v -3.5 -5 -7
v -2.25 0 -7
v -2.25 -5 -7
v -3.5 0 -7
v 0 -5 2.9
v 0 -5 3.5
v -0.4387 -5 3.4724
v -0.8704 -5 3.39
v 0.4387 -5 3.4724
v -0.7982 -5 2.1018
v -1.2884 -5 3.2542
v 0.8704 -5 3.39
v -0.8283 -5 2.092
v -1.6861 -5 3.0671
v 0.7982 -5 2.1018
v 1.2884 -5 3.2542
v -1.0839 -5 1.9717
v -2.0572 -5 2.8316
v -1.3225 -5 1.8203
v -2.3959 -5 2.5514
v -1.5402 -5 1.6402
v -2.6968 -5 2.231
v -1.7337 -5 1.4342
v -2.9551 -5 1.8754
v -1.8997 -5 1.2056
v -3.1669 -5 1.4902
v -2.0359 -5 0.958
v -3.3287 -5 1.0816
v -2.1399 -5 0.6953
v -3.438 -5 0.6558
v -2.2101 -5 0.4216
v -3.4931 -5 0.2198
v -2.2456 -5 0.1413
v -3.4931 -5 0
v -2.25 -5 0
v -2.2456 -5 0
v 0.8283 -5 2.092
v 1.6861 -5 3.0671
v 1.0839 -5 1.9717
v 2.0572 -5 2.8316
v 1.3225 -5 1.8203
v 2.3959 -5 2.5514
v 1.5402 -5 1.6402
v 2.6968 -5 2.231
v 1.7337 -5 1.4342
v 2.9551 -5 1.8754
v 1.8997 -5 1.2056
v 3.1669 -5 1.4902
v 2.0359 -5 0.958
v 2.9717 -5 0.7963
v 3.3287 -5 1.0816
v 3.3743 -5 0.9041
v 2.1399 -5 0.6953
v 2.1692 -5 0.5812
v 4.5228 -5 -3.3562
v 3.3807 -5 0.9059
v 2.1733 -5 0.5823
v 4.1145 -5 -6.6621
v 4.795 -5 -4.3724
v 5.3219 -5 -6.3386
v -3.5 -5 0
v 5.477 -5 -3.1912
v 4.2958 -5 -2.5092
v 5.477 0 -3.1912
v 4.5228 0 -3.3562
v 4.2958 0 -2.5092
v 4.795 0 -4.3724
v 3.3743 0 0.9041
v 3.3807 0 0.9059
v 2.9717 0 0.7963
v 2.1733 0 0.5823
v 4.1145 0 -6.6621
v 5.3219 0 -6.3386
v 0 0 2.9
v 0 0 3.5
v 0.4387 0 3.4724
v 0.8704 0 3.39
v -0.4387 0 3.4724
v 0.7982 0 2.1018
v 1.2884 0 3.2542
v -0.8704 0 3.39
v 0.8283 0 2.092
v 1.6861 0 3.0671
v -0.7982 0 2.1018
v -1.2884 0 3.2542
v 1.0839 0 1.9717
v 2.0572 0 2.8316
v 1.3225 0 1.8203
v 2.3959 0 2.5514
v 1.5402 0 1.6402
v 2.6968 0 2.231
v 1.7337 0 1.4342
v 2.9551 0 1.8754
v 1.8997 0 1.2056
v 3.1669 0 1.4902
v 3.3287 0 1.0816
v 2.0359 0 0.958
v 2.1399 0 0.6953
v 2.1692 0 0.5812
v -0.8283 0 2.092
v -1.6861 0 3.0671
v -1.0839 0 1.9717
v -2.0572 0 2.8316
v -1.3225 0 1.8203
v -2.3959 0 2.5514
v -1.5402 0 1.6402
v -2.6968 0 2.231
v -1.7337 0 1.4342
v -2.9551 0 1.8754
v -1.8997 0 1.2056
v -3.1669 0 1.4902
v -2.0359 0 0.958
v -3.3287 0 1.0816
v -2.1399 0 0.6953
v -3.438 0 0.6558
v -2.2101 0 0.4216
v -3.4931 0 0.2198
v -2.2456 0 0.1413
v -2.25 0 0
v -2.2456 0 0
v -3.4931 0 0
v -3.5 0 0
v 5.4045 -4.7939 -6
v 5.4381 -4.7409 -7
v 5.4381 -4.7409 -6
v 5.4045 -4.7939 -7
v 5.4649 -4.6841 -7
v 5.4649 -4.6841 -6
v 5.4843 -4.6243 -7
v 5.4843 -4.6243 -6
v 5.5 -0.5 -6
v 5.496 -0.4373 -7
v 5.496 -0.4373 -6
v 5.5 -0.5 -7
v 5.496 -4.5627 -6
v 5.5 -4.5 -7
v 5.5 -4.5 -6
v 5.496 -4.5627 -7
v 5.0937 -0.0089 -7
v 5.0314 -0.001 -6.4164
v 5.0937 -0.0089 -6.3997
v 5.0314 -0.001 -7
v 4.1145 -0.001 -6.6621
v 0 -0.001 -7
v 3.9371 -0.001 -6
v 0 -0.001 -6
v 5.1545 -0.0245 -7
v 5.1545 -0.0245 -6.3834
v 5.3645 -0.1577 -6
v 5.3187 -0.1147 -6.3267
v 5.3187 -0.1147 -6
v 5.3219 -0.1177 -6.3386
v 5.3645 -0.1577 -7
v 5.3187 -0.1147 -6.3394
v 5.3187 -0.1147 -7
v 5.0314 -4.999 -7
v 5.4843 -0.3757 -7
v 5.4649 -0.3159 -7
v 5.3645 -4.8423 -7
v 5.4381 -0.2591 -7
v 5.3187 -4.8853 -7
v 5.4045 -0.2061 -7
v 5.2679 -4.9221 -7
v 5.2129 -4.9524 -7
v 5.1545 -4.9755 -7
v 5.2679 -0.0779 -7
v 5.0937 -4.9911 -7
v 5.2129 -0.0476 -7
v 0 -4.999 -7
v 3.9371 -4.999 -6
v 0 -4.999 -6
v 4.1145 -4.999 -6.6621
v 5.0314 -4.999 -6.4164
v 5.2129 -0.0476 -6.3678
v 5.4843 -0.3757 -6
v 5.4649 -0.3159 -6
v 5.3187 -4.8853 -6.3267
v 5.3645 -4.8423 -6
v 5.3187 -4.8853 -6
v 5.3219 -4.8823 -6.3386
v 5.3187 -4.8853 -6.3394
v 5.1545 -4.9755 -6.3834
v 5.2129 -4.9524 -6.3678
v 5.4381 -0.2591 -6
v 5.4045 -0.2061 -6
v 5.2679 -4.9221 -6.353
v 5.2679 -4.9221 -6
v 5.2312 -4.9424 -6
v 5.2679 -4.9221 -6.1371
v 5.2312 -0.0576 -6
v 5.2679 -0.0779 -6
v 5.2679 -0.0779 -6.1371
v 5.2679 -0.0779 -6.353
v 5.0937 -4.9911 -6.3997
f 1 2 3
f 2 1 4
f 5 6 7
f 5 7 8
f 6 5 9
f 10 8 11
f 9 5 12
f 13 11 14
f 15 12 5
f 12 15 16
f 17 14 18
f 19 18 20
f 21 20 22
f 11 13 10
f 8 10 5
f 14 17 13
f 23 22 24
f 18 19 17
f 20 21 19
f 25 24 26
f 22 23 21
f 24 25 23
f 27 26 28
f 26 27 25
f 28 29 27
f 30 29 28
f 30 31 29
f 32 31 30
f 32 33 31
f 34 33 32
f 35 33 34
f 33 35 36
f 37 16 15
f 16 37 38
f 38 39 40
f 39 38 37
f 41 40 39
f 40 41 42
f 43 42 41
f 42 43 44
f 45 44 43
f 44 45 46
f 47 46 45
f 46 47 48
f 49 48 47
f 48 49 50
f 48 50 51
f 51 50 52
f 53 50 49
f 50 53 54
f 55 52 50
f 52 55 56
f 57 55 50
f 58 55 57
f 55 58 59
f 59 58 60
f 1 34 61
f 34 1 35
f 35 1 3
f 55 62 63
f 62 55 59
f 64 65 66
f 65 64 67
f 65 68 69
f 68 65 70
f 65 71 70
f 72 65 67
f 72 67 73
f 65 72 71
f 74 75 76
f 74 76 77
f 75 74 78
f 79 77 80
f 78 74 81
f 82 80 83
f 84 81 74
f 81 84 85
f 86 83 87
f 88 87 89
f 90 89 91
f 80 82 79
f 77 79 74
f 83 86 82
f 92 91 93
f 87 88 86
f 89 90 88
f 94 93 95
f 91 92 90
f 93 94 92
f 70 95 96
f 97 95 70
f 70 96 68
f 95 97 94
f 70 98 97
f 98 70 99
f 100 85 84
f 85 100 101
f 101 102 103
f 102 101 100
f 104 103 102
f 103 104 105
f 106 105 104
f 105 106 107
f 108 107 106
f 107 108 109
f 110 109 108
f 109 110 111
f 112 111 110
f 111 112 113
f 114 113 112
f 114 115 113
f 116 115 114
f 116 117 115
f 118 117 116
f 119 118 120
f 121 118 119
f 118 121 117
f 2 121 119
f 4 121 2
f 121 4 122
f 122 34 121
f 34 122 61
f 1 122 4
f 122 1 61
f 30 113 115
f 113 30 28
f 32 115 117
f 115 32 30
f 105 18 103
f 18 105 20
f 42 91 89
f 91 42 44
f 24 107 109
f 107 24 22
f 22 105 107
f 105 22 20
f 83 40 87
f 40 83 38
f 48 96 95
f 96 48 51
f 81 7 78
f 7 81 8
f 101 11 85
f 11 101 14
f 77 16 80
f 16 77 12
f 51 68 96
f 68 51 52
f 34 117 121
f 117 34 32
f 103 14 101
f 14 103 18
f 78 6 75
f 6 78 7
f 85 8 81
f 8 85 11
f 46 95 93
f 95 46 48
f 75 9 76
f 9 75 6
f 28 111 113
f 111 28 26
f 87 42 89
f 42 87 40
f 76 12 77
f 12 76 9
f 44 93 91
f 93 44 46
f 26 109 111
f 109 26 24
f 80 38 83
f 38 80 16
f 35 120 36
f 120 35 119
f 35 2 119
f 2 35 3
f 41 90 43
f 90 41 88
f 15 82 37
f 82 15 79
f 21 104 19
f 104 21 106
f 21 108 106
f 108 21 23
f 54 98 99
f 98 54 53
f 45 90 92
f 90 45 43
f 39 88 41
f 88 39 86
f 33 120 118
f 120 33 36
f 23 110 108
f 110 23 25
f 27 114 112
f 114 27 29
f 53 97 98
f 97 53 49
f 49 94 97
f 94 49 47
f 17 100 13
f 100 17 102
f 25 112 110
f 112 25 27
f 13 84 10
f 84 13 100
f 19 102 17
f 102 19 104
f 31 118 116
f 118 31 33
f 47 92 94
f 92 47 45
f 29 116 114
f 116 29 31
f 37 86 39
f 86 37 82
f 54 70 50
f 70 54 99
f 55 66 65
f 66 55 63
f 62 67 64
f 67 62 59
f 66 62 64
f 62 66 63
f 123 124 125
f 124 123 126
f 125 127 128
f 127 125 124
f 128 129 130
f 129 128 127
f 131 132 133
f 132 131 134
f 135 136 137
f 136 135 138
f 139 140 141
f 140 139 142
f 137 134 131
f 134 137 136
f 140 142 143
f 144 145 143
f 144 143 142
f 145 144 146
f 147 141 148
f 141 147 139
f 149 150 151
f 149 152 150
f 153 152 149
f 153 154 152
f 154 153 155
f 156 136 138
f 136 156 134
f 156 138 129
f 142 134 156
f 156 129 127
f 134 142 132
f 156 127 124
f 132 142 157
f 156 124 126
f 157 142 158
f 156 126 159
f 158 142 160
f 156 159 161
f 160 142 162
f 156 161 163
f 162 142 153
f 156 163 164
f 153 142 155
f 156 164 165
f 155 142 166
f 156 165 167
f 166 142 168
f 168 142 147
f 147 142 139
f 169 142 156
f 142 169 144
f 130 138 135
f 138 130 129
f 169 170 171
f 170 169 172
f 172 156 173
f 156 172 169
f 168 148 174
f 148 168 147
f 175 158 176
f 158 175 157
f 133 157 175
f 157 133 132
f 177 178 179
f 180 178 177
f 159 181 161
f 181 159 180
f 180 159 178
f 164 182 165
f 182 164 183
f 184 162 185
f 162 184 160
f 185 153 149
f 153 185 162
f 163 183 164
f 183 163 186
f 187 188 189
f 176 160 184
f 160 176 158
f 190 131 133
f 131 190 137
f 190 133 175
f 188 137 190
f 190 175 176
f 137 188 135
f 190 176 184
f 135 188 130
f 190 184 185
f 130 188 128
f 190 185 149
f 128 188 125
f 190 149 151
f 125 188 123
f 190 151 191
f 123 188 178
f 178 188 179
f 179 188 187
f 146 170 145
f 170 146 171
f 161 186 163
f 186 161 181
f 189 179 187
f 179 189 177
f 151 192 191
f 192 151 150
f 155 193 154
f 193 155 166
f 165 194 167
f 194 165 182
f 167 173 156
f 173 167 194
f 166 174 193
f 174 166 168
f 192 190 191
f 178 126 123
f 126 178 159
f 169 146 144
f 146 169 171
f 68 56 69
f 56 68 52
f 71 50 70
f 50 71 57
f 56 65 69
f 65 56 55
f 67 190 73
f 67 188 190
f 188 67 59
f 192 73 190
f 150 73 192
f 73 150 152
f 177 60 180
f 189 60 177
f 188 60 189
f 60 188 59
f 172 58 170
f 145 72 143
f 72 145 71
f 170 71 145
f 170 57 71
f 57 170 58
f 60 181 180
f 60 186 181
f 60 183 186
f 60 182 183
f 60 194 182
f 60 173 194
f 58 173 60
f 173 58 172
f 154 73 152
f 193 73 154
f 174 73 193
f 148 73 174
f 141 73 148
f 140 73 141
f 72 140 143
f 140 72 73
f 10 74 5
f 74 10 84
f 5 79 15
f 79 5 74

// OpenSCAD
$fn = 50;
rotate_d = 15;
tip_lenght = 6;
thikness = 5;
width = 7;
height = 7;


// translate([-0.5,0,1.4])#sup_triangel();

module sup_triangel()
{
    h = 1;
points = [[(h),0],[-(h),0],[0,h]];
rotate([90,0,0])linear_extrude(10)polygon(points);
}
module locker()
{
    
    r1 = 7;
    
    cylinder(8,5,5);
    cylinder(3,1,r1);
    translate([0,0,5])mirror([0,0,1])cylinder(2,1,r1);
    translate([0,0,2])cylinder(h= 1, r = r1);
    translate([0,0,8.5])cube([2,9,2],true)
    
    ;}
    
    
    
    
    
    

    

    module the_tip(){
      {  difference(){
       translate([height-1,width/2+0.5,0.5])
       
       rotate([90,0,90]) linear_extrude(1)minkowski(){
       square([tip_lenght-1,thikness-1],false);
         
           
           
 //translate([height-1,(width/2)+tip_lenght,thikness/2])rotate([90,0,90])
            circle(r = 0.5);
        }
        
        
        translate([height-1-0.1,width/2-0.2,-0.1])rotate([90,0,90])linear_extrude(2)square([0.5+0.2,thikness+0.2]);
        }
       }}
       
    
       
   module latch(h = 10, width = width, thikness = thikness){
    union(){  
        
       translate([0,-width/2,0])cube([h,width,thikness]);
            cylinder(r =width/2,h = thikness);
       }
       }
       
       module lock_m(){
    difference(){
    union(){
       difference()
       {latch(height, width);
       translate([0,0,-0.1])latch(height*2,width-2.5,width+5);
           rotate([0,0,rotate_d])translate([0,-1,-1])cube([20,10,10]);
          translate([0,-1,-1]) cube([20,10,10]);
       }
       
       
       rotate([0,0,rotate_d])translate([3,1,0]){snap();}
       
       
       translate([0,-4,0])the_tip();
   
              rotate([0,0,rotate_d])translate([0,(width-1)/2-0.75,0])cube([height+0.5,1.25,thikness]);
       }
       translate([-1.9,0,8])rotate([90,0,-90])sup_triangel();
       }
       }
       
      // lock_m();
       
    translate([4.5,-2.5,-11.7])
       scale(1)translate([-4.5,2.5,11.7])rotate([90,90,0])lock_m();
 


 module snap(w = 5,h= height, t= thikness)
       {
           
           
           difference(){
       translate([height-5.5,(w/2)+2,t/2])rotate([0,0,0])cube([7.3,4,t],true);
    
               translate([height-3,w-(0.5),t/2])rotate([0,0,45])cube([5,8,t*2],true);
       
               translate([height-8,w-(0.5),t/2])rotate([0,0,45])cube([8,5,t*2],true);
             
           
     }
       
           
           }
       
